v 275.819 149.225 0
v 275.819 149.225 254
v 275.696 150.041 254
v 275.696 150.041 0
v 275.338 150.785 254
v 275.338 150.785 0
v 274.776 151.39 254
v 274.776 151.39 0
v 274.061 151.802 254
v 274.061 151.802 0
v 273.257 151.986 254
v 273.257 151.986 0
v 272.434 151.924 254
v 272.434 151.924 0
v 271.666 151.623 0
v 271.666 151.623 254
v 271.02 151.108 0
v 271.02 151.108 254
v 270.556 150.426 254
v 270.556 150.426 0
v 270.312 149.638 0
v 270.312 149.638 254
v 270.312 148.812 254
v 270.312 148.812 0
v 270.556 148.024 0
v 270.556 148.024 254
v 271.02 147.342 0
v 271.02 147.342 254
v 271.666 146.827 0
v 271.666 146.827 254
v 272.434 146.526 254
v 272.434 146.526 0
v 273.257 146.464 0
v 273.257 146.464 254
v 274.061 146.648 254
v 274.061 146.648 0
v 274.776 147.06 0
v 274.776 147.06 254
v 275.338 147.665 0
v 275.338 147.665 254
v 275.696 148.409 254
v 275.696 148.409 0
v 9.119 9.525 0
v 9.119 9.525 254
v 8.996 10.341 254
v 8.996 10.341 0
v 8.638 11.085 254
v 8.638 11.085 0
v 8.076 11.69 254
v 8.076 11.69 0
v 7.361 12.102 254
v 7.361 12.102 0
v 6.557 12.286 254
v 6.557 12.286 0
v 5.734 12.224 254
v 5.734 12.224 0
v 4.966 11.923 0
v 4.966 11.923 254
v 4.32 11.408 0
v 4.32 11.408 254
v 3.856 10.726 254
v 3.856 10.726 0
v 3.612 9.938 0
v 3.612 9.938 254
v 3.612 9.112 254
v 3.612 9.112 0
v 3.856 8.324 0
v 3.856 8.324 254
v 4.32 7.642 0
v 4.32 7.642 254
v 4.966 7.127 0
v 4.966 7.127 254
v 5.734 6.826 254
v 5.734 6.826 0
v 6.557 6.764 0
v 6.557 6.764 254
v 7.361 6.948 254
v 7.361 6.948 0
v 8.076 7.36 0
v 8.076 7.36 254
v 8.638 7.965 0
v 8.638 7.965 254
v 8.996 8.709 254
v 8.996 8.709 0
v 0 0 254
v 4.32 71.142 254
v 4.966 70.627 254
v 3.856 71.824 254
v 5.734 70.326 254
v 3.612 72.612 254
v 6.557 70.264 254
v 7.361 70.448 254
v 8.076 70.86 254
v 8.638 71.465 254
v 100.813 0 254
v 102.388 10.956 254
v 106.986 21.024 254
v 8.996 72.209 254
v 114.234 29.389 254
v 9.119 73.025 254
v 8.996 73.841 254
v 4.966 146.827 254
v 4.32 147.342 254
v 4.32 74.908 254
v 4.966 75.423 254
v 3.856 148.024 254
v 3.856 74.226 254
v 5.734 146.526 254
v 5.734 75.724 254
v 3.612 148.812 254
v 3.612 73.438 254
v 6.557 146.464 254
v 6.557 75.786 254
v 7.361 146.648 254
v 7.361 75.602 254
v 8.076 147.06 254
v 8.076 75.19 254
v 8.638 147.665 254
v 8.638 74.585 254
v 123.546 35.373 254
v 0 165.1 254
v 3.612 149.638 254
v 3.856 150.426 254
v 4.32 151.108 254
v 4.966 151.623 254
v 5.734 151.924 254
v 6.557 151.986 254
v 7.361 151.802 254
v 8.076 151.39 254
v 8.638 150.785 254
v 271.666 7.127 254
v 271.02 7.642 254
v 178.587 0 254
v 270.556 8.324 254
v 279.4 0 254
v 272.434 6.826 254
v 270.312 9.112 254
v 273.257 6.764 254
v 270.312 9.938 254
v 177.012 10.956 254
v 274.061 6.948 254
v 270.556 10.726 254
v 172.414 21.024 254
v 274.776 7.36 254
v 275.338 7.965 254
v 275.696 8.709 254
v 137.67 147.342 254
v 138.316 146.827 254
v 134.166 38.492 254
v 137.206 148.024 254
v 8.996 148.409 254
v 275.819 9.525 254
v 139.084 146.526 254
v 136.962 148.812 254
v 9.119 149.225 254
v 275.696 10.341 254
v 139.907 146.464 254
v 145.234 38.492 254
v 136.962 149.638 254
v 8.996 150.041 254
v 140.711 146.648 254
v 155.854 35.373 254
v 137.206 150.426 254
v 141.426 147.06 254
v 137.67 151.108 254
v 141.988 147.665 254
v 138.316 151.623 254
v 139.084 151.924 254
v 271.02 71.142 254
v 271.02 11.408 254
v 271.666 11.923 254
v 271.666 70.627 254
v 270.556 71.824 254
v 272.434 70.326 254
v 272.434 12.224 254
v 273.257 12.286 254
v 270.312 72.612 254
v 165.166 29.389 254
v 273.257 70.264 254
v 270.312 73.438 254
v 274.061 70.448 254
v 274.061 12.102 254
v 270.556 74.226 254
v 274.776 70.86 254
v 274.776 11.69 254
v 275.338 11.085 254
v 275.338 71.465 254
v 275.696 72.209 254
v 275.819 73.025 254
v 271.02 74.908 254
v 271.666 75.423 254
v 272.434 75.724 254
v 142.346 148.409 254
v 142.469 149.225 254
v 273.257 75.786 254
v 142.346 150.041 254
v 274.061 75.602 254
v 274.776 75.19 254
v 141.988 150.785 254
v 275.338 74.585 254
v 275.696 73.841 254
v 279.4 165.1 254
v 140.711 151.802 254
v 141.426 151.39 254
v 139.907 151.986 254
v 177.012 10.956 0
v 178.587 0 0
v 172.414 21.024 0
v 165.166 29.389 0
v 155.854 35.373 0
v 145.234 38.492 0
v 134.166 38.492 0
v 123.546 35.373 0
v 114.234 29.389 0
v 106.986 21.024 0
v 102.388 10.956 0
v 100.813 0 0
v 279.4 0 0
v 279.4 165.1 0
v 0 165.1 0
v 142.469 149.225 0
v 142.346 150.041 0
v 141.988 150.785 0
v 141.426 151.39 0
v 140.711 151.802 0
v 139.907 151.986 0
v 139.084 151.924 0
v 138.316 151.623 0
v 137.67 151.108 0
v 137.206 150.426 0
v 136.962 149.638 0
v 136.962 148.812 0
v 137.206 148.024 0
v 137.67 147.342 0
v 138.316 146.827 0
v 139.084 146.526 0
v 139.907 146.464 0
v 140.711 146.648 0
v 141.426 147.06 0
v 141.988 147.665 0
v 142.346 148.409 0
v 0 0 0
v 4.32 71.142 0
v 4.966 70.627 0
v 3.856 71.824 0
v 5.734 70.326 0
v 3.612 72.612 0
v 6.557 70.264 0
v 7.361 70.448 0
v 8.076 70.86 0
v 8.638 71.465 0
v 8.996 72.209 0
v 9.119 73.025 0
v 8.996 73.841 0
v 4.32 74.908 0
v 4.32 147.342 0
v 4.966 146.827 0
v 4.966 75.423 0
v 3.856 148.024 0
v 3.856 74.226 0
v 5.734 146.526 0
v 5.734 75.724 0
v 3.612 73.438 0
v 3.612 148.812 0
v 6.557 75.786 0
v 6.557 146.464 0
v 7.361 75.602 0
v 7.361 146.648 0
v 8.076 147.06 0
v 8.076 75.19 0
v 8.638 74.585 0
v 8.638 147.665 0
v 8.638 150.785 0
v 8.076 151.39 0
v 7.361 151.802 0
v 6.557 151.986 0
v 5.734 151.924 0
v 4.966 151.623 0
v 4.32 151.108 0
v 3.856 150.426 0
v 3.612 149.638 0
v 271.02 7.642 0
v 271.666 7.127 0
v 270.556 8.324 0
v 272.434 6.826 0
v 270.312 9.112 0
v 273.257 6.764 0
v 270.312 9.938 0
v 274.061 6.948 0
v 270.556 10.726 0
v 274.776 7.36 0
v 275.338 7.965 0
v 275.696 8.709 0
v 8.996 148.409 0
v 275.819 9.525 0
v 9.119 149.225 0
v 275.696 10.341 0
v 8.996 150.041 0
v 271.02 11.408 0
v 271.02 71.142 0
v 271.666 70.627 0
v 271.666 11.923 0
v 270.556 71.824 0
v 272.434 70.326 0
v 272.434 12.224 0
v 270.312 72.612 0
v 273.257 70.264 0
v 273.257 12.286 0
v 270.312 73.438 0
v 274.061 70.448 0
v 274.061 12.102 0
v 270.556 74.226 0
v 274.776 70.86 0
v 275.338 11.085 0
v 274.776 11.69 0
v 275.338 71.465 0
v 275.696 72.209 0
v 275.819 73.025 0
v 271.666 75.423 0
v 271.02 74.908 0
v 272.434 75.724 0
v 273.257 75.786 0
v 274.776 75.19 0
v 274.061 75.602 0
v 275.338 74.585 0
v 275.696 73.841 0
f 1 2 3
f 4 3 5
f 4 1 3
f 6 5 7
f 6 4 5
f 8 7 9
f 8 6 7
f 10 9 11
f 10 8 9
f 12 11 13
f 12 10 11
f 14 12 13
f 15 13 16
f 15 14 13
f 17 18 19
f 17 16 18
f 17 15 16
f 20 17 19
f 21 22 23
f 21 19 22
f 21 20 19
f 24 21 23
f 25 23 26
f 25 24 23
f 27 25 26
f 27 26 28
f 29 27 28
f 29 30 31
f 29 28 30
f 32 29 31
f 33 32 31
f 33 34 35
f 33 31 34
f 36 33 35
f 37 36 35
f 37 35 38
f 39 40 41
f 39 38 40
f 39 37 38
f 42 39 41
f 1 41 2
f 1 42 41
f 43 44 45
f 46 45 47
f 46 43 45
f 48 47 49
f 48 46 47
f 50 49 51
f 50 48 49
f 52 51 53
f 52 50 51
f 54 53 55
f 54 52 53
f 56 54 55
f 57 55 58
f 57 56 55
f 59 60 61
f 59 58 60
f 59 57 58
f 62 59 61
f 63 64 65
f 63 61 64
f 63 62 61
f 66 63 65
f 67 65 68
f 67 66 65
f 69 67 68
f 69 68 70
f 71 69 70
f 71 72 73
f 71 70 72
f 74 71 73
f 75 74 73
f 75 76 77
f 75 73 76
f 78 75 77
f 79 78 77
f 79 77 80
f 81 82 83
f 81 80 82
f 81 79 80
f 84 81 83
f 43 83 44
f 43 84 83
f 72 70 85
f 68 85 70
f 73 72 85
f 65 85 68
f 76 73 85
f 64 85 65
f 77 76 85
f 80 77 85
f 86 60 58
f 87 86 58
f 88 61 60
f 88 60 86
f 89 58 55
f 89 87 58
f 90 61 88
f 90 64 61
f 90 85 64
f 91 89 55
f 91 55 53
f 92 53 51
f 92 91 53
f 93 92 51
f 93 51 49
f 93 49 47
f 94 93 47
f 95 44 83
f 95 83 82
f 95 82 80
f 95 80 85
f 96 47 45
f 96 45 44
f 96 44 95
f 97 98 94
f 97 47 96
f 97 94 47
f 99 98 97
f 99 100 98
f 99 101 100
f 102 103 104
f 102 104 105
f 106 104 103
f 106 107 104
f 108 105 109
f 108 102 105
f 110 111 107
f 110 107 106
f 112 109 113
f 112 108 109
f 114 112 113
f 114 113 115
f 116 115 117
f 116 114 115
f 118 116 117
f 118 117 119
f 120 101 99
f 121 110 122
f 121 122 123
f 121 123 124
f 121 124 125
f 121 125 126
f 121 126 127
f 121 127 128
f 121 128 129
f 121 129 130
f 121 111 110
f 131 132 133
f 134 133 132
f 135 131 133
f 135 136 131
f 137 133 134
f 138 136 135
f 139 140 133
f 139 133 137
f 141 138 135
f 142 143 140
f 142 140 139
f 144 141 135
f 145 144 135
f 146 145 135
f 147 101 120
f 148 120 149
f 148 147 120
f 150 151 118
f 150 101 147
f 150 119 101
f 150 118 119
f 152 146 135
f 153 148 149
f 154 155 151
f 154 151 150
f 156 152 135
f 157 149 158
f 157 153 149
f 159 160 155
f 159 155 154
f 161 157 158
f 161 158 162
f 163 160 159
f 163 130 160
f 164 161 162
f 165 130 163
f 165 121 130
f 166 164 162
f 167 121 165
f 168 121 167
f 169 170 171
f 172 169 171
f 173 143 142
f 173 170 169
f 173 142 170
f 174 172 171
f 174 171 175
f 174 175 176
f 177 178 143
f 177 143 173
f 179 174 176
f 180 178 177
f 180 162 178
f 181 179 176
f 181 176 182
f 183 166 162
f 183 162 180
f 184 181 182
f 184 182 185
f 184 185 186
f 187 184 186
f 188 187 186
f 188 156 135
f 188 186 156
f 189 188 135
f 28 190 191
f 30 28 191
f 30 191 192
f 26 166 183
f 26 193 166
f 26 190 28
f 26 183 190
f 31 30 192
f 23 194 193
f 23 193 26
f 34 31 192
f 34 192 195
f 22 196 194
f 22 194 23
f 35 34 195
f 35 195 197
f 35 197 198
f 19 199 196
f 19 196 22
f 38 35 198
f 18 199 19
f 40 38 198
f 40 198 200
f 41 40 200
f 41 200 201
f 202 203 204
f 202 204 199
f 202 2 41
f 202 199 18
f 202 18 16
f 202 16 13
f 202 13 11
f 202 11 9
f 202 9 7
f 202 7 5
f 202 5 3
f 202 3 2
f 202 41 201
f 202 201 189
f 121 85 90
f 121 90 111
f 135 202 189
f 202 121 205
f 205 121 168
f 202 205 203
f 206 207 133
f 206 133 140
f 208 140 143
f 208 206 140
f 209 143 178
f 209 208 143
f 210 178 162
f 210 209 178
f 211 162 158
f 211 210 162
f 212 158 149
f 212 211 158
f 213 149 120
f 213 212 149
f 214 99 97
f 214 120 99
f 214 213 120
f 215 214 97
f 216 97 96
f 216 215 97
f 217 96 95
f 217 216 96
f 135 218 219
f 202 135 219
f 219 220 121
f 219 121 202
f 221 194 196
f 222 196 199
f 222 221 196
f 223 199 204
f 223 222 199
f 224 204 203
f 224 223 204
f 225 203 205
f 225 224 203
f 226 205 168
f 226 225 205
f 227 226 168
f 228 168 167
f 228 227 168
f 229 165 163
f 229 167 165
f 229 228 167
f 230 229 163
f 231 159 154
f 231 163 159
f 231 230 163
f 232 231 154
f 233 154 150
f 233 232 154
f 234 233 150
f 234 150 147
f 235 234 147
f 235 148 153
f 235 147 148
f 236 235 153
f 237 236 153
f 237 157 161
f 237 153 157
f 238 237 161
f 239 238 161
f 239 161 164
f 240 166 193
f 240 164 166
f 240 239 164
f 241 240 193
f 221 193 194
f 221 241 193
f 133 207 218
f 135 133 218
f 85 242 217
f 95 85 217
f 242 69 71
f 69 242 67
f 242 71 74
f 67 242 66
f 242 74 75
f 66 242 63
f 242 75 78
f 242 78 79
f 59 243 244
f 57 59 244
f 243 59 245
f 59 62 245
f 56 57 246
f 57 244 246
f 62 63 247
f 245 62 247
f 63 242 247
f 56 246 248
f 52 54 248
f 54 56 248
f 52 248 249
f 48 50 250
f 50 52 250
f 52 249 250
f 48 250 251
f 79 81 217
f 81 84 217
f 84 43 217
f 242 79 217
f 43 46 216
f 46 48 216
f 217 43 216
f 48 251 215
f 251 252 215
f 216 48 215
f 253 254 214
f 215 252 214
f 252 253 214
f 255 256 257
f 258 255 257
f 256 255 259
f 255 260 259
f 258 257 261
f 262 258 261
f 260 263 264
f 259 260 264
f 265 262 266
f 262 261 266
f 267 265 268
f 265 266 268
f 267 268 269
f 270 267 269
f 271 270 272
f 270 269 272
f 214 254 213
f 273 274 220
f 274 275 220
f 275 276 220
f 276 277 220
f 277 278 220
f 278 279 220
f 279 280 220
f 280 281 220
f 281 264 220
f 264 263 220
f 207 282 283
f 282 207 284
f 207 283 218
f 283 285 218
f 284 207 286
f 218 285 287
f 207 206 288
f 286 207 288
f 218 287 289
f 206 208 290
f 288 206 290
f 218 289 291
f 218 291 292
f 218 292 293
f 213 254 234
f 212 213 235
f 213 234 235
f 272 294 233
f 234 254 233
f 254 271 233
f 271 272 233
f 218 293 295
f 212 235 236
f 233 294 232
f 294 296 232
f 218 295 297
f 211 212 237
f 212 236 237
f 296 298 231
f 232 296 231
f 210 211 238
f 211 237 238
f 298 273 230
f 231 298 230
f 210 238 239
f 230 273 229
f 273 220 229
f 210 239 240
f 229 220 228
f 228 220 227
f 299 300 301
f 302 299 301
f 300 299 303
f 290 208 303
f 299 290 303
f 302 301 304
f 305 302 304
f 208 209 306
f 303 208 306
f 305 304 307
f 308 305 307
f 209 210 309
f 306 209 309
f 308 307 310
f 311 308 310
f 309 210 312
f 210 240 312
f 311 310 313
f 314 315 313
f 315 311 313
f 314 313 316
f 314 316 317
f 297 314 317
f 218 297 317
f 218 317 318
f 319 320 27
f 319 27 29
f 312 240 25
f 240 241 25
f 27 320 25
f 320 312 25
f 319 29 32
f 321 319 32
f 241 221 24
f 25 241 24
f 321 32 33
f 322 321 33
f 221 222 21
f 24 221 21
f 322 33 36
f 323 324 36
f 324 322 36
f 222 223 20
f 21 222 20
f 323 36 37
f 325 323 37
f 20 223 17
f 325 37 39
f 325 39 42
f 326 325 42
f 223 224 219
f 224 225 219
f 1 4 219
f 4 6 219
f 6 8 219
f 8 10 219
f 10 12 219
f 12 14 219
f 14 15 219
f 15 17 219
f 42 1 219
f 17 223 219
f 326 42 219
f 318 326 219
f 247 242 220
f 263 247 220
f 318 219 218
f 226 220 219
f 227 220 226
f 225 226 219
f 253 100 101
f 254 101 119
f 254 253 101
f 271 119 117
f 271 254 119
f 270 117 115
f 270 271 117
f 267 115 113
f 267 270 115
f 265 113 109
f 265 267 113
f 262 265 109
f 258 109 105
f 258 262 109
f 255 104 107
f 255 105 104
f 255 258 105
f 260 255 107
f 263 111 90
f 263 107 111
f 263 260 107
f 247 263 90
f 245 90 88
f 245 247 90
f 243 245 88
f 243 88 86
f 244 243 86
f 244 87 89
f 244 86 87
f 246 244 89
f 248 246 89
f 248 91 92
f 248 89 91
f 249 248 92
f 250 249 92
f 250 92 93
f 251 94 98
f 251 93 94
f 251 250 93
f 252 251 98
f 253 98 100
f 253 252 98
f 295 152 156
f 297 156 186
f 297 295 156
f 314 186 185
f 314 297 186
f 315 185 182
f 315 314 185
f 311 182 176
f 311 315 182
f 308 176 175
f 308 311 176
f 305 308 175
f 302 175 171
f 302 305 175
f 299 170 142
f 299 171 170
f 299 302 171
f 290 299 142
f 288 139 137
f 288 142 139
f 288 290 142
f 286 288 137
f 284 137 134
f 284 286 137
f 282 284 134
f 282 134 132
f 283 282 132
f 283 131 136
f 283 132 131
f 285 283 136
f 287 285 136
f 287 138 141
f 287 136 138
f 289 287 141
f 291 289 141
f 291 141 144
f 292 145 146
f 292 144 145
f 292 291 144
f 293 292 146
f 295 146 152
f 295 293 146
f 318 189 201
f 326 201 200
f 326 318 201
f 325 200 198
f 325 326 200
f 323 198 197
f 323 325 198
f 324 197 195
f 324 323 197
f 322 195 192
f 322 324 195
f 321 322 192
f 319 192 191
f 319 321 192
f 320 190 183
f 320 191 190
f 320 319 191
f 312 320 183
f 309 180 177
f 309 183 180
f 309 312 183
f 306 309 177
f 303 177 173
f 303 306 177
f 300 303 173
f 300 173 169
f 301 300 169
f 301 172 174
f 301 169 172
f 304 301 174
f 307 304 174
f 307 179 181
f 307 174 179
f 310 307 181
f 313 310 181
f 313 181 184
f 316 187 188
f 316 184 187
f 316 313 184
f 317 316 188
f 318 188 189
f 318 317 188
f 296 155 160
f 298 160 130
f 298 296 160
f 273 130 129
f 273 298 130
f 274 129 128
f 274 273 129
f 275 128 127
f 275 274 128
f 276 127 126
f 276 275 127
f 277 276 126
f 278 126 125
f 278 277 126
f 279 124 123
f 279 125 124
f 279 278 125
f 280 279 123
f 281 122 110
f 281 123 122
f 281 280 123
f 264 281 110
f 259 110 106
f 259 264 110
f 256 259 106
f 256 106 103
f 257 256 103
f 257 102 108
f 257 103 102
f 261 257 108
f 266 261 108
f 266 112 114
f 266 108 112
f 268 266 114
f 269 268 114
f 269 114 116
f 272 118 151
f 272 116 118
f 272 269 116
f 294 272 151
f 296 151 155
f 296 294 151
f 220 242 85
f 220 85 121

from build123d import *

# Parameters (mm, degrees)
SKETCH1_W           = 279.4
SKETCH1_H           = 165.1
BOSS_EXTRUDE1_DEPTH = 254
SKETCH2_R           = 38.8874
CUT_EXTRUDE1_DEPTH  = 413.114510786
SKETCH3_R           = 2.7686
CUT_EXTRUDE2_DEPTH  = 413.114510786


with BuildPart() as part:
    # Sketch1 → Boss-Extrude1 (new body)
    with BuildSketch(Plane.XY):
        with Locations((139.7, 82.55)):
            Rectangle(SKETCH1_W, SKETCH1_H)
    extrude(amount=BOSS_EXTRUDE1_DEPTH)

    # Sketch2 → Cut-Extrude1 (cut, through all)
    with BuildSketch(Plane.XY):
        with Locations((139.7, 0)):
            Circle(SKETCH2_R)
    extrude(amount=CUT_EXTRUDE1_DEPTH, mode=Mode.SUBTRACT)

    # Sketch3 → Cut-Extrude2 (cut, through all)
    with BuildSketch(Plane.XY):
        with Locations((6.35, 149.225)):
            Circle(SKETCH3_R)
        with Locations((139.7, 149.225)):
            Circle(SKETCH3_R)
        with Locations((273.05, 149.225)):
            Circle(SKETCH3_R)
        with Locations((6.35, 73.025)):
            Circle(SKETCH3_R)
        with Locations((273.05, 73.025)):
            Circle(SKETCH3_R)
        with Locations((6.35, 9.525)):
            Circle(SKETCH3_R)
        with Locations((273.05, 9.525)):
            Circle(SKETCH3_R)
    extrude(amount=CUT_EXTRUDE2_DEPTH, mode=Mode.SUBTRACT)


solid = part.part
